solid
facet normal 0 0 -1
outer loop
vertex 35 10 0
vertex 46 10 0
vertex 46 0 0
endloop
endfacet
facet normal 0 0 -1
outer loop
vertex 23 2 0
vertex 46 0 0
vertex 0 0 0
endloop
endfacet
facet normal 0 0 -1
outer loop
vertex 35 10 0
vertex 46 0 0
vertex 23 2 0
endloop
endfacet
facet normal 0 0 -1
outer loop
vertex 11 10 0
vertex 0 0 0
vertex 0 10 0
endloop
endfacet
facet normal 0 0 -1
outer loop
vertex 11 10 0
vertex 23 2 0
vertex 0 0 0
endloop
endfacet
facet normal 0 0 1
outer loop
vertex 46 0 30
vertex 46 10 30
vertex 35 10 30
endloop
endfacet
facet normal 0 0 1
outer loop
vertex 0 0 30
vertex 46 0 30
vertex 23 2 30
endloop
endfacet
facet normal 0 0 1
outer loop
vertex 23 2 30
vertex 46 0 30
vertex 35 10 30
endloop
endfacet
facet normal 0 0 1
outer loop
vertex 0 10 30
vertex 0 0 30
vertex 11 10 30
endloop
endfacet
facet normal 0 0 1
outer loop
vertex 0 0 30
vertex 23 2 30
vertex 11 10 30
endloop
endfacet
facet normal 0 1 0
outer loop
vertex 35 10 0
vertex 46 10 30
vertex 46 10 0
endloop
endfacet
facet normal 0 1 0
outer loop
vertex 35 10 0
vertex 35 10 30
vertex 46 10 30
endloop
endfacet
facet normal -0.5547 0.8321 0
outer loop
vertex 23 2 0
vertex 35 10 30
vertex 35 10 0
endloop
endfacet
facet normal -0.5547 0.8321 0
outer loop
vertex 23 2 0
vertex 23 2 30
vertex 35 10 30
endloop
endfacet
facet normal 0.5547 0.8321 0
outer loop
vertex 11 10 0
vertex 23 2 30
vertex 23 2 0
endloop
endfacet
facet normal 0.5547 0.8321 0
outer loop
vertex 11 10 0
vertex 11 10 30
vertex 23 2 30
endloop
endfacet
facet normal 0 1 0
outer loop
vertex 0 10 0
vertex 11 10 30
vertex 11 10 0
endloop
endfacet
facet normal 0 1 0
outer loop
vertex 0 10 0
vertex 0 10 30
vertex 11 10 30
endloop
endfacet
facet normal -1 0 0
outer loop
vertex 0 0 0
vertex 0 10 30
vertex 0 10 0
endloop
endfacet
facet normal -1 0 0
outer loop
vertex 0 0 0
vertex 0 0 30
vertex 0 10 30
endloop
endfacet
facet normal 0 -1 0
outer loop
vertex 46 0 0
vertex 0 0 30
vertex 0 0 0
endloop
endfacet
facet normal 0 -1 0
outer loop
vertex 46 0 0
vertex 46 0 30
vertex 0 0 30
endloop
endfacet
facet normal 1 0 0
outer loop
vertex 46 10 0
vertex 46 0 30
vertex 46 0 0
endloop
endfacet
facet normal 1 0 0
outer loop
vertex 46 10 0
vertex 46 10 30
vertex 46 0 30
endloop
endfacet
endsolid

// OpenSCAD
$fn = 32;

// ----------------------------------------------------------------------
// V guide rail: vway, 46 mm wide
// ----------------------------------------------------------------------

// --- parameters (mm) ---
rail_w = 46;              // rail width, X
base_t = 10;              // base plate thickness
v_depth = 8;              // V feature depth / height
v_half_w = 12;            // half width of the V at the base face
plate_t = 30;             // rail length, Z (the extrusion height)

profile = [[0, 0], [46, 0], [46, 10], [35, 10], [23, 2], [11, 10], [0, 10]];  // primary outline, 7 points, counter clockwise

// --- the one profile operation ---
linear_extrude(height = plate_t) polygon(points = profile);
